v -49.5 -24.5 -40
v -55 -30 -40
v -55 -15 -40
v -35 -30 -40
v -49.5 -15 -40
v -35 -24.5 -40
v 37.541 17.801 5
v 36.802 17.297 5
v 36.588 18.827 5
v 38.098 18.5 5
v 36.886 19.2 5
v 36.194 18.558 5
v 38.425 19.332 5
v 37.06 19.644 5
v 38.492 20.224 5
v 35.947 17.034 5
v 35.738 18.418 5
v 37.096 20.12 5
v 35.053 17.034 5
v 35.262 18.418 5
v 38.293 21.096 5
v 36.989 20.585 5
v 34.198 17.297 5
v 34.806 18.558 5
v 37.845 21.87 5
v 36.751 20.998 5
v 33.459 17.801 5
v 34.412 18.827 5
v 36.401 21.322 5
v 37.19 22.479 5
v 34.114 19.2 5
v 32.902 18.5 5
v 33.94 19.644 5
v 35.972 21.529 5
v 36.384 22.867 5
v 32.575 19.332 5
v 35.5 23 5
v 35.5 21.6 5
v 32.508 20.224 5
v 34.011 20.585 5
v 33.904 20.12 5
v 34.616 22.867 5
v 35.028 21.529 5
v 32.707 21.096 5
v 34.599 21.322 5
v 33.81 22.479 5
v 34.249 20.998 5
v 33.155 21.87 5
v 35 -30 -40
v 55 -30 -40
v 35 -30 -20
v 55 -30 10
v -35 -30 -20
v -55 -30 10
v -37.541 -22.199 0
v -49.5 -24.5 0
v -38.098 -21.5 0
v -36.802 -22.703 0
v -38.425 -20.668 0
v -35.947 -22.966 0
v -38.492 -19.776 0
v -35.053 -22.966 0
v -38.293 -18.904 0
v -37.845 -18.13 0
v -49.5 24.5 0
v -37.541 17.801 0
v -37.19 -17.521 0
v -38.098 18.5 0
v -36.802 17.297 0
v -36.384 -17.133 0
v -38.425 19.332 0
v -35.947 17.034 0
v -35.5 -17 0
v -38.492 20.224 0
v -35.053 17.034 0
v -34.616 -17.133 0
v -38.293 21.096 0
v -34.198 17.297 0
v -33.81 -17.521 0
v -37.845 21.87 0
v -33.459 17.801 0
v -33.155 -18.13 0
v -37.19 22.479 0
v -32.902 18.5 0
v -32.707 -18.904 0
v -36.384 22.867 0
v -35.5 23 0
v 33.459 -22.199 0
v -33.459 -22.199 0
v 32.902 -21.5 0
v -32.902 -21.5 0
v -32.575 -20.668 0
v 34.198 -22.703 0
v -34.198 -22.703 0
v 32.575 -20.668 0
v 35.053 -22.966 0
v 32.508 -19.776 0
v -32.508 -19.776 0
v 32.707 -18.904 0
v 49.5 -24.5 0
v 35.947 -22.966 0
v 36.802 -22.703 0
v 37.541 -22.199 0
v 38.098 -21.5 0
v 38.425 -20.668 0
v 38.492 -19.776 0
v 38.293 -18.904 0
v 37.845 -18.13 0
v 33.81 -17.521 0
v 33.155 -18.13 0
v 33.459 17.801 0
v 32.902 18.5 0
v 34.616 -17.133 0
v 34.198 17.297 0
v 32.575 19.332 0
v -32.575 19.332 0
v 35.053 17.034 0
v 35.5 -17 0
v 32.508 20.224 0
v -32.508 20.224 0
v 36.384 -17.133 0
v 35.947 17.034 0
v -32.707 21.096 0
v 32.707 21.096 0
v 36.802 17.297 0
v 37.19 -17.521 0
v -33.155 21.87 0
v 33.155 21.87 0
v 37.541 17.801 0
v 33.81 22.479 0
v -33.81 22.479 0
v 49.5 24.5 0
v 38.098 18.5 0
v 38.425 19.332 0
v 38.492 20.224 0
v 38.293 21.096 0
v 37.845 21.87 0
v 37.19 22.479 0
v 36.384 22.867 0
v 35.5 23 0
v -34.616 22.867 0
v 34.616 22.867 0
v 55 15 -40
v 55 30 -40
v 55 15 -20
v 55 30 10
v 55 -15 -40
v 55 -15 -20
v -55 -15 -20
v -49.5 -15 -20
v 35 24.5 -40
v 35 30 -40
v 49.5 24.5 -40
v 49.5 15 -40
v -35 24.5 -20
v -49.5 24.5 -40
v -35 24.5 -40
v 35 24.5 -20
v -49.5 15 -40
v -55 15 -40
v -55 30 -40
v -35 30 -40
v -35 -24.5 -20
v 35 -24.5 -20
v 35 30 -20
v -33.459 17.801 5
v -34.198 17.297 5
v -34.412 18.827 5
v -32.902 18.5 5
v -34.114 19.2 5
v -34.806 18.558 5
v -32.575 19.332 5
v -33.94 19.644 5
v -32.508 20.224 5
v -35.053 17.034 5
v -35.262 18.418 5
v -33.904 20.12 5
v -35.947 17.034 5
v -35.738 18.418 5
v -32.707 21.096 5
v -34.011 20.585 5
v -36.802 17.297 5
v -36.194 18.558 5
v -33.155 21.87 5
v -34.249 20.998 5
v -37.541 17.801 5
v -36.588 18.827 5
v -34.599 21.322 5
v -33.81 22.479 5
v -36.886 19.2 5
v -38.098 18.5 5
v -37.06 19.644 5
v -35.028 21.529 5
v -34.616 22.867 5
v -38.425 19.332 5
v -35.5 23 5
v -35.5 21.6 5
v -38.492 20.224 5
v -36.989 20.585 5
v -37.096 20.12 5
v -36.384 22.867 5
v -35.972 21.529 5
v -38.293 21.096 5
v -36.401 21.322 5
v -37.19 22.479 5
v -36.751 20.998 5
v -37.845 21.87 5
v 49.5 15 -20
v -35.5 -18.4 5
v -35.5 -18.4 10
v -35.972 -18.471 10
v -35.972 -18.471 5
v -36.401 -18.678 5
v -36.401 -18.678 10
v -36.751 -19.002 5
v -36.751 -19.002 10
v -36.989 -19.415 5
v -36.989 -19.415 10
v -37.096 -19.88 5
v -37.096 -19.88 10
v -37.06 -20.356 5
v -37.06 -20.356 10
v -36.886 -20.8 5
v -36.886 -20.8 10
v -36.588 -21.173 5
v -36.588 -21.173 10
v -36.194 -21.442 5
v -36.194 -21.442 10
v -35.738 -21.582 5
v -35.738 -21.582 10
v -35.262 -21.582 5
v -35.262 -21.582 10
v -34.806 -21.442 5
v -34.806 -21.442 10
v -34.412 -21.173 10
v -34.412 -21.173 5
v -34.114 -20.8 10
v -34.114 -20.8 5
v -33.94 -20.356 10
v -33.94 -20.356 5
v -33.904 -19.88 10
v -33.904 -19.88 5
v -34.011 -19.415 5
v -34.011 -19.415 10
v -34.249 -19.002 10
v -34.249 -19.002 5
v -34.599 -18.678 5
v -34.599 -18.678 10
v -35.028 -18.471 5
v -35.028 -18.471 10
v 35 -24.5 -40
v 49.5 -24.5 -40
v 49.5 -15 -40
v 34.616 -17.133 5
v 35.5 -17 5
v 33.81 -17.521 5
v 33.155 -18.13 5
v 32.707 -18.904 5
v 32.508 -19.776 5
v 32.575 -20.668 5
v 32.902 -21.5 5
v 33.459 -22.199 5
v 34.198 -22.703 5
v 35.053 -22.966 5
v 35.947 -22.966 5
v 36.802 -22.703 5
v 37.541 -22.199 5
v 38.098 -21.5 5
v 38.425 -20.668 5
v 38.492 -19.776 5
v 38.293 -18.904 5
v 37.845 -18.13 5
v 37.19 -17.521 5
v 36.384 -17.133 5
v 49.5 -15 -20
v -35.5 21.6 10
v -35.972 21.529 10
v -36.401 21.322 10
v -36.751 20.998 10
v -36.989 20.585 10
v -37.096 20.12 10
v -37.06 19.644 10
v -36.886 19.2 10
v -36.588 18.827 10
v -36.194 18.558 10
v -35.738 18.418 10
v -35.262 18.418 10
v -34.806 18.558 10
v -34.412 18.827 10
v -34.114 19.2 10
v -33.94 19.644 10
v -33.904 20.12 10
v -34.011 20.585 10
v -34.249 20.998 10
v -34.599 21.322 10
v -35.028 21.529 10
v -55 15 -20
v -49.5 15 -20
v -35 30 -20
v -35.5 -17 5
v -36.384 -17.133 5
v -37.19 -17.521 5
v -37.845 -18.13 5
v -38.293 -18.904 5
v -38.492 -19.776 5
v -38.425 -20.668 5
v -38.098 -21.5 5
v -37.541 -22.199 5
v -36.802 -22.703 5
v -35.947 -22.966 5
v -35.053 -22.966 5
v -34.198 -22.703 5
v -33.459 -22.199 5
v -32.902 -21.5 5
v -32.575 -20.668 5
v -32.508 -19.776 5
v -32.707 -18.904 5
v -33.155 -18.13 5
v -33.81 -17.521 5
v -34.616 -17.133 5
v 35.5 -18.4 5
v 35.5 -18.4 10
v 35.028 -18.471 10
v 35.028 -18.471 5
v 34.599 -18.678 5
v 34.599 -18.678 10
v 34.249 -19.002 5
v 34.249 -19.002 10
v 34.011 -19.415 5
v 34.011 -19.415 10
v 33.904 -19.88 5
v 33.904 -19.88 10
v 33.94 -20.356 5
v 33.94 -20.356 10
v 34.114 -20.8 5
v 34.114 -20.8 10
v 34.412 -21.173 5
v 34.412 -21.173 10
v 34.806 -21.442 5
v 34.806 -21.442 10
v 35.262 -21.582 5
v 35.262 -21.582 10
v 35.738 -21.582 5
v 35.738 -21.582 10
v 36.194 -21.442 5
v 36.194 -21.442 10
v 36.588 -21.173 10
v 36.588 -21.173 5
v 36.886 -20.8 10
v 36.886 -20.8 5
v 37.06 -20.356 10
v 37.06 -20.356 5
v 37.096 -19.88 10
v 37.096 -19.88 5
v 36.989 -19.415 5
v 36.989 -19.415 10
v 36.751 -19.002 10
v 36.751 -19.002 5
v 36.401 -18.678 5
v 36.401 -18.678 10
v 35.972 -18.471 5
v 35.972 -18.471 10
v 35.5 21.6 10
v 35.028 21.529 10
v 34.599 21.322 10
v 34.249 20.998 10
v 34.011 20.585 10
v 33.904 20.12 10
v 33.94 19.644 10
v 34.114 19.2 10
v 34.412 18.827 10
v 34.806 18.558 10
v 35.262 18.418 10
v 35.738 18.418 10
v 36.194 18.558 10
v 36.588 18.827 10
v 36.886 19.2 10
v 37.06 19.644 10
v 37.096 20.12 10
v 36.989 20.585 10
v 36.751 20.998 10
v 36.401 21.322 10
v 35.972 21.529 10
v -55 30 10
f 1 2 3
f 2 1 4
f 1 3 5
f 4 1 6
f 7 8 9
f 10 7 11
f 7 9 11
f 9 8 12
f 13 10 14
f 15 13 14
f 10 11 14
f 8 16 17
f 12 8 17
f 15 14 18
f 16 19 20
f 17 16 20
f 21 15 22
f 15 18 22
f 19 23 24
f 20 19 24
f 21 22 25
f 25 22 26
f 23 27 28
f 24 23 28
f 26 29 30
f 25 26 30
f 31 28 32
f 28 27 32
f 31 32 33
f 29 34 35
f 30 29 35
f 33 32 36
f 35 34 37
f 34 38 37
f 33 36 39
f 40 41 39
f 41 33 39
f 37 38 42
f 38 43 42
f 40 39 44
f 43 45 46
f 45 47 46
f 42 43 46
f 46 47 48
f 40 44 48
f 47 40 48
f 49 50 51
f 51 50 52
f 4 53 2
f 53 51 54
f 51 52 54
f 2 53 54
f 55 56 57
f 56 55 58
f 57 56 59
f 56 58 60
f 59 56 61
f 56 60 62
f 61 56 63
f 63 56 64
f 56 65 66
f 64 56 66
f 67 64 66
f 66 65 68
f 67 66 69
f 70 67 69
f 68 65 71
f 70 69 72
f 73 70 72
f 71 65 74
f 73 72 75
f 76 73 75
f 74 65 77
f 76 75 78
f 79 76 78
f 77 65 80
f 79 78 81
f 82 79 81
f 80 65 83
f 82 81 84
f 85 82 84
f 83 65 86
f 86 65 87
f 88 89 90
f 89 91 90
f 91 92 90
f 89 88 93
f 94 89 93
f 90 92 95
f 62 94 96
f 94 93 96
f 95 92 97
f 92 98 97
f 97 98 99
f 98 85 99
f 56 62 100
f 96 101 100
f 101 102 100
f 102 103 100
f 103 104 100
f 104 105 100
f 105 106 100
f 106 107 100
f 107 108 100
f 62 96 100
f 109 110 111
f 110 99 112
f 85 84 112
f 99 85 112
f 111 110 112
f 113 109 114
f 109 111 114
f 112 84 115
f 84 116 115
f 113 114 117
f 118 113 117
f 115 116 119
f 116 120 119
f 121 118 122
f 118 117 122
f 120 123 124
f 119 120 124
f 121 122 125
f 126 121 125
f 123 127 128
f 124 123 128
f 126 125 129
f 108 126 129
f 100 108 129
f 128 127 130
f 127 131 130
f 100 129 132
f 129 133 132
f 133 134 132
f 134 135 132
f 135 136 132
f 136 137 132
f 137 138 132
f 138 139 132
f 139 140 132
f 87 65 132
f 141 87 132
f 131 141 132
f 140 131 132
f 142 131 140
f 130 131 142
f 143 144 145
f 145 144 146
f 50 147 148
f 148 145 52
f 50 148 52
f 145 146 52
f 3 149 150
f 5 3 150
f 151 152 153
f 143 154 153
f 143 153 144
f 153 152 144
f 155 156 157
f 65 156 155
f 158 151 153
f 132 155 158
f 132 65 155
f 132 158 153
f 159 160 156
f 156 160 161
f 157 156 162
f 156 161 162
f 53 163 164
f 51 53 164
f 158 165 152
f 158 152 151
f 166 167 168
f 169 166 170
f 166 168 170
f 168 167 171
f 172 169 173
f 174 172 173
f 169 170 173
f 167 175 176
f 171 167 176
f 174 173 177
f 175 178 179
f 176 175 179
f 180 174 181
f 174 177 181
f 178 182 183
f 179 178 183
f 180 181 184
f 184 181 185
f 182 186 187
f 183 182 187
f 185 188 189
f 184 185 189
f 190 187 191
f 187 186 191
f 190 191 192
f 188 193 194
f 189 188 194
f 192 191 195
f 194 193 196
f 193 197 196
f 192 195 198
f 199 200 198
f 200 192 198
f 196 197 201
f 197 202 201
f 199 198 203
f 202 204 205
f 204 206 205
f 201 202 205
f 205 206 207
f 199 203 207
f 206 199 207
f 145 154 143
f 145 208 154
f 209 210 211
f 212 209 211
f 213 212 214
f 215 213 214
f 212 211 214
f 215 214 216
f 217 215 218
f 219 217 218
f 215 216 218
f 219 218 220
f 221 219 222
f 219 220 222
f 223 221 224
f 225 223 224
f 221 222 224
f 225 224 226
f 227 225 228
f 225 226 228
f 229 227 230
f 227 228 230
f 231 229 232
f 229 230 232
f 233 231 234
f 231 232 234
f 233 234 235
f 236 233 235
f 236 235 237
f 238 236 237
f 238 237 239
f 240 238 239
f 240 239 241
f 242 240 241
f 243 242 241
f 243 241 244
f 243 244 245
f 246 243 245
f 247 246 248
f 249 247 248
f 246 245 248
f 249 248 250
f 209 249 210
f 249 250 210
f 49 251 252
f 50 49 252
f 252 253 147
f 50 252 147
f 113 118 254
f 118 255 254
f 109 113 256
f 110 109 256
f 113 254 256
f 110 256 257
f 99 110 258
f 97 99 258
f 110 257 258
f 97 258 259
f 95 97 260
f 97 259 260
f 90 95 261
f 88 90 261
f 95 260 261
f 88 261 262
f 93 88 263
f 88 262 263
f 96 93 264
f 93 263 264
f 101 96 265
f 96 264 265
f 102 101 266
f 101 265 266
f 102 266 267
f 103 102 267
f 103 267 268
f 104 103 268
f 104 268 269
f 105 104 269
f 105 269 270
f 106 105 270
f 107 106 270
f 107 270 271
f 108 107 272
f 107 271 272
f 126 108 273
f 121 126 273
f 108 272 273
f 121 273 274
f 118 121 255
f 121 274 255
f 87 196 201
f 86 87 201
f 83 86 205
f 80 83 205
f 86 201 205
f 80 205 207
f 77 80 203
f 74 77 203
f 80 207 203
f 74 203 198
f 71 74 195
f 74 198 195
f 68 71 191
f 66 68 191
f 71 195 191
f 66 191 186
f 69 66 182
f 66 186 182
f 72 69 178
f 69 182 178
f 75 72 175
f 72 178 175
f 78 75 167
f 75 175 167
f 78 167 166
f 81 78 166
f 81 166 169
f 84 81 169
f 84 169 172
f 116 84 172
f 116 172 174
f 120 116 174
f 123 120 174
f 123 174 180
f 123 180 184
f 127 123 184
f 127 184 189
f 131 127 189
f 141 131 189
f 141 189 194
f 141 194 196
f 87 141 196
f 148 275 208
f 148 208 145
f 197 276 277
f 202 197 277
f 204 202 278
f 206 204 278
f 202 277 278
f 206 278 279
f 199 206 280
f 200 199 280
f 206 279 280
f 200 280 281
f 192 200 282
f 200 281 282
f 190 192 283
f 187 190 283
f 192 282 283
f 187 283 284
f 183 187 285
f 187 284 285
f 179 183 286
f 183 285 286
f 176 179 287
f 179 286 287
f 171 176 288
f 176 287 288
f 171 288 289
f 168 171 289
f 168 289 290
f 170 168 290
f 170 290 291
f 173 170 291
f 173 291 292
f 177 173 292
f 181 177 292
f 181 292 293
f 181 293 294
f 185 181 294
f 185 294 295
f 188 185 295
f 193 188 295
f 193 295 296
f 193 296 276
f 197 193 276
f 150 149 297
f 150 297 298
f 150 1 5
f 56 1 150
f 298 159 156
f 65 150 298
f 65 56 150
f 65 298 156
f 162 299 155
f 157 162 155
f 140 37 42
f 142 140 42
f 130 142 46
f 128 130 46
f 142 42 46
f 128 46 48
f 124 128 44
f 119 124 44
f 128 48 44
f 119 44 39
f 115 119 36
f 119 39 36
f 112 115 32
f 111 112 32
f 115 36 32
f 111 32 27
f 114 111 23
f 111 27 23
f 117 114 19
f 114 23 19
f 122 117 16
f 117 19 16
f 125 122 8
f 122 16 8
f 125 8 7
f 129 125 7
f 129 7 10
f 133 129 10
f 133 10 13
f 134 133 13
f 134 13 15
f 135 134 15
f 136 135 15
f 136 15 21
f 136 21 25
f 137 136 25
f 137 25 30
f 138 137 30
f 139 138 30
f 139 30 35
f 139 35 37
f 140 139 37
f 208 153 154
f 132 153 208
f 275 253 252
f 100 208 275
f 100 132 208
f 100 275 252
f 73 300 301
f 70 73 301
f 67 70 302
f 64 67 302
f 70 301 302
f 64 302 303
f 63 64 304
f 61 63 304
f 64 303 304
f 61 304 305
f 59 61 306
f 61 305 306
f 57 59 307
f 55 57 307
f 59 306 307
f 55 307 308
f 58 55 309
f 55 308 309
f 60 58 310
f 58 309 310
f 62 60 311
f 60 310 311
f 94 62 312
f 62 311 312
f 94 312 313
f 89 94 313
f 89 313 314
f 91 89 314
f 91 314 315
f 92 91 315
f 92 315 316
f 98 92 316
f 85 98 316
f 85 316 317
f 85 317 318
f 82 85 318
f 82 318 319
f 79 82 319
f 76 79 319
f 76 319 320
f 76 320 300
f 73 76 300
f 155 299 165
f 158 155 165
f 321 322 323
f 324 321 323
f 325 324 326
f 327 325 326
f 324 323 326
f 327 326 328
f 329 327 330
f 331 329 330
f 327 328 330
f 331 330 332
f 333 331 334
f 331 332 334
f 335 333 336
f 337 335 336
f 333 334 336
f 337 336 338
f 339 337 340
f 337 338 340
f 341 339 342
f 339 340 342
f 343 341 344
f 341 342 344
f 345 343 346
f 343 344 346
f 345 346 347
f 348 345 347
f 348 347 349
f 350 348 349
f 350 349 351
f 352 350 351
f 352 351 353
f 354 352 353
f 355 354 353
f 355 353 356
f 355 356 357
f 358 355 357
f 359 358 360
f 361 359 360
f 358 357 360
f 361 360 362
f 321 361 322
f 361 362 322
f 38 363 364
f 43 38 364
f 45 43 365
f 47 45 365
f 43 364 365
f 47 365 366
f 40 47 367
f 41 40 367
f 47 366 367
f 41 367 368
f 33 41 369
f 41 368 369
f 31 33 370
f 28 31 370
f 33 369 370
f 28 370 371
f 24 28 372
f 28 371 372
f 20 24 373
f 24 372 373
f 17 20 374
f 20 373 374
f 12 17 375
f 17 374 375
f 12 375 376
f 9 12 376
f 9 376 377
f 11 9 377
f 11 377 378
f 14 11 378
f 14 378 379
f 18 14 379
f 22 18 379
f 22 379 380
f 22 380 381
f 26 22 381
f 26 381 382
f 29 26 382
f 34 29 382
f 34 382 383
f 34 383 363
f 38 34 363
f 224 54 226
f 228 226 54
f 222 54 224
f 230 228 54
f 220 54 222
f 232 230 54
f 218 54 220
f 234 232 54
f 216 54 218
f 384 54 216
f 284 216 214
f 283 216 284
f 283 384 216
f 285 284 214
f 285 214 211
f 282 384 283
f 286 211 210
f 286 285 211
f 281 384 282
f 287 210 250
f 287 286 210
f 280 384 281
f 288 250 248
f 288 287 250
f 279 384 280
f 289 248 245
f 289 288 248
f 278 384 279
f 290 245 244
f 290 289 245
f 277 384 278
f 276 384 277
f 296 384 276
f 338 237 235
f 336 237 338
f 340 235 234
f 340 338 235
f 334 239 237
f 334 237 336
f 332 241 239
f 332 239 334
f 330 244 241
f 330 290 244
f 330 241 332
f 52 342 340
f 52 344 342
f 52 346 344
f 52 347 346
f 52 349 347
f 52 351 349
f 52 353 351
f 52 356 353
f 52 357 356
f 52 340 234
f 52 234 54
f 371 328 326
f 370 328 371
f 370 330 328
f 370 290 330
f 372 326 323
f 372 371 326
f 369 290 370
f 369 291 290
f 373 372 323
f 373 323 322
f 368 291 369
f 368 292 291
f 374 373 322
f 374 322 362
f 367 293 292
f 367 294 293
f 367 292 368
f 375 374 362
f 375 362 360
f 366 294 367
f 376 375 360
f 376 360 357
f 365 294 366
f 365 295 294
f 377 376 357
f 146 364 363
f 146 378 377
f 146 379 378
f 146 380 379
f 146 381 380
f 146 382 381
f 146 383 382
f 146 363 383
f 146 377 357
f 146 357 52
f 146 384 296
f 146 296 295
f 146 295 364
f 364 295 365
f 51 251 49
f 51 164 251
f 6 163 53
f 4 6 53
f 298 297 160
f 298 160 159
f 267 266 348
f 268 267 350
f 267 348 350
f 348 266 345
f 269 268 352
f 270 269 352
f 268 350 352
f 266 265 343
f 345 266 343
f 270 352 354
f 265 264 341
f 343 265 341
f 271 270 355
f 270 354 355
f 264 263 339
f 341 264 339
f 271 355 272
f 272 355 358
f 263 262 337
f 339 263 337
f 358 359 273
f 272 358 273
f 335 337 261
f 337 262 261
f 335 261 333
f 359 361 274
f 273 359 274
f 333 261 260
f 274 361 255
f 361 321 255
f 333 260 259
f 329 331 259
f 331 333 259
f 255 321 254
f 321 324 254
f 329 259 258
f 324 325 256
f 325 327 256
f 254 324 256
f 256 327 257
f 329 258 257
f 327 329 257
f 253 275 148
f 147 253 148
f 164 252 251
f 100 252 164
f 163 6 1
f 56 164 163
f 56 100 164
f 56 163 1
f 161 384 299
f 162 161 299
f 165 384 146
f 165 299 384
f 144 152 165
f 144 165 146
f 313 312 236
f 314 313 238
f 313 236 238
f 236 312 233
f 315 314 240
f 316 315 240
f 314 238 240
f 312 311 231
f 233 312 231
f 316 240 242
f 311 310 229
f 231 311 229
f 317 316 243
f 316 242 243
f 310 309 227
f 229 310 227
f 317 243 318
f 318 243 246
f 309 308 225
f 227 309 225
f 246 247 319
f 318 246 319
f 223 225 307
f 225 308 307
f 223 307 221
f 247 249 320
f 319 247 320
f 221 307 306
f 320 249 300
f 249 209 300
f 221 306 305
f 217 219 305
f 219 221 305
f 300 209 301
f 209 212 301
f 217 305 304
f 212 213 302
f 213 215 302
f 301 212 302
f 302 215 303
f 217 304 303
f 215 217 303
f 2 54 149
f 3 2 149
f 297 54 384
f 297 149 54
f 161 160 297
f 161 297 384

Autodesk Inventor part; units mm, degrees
ref_plane "YZ Plane" through (0, 0, 0) normal (1, 0, 0) x (0, 1, 0)
ref_plane "XZ Plane" through (0, 0, 0) normal (0, 1, 0) x (-1, 0, 0)
ref_plane "XY Plane" through (0, 0, 0) normal (0, 0, 1) x (1, 0, 0)
sketch "Sketch1" plane through (0, 0, 0) normal (0, 0, 1) x (1, 0, 0)
  line L0 (55, -30) -> (-55, -30)
  line L1 (-55, -30) -> (-55, 30)
  line L2 (-55, 30) -> (55, 30)
  line L3 (55, 30) -> (55, -30)
  line L4 (49.5, -24.5) -> (-49.5, -24.5)
  line L5 (-49.5, -24.5) -> (-49.5, 24.5)
  line L6 (-49.5, 24.5) -> (49.5, 24.5)
  line L7 (49.5, 24.5) -> (49.5, -24.5)
  line L8 (55, 0) -> (-55, 0) construction
  line L9 (0, -30) -> (0, 30) construction
  line L10 (-35, 30) -> (-35, 24.5)
  line L11 (-55, 15) -> (-49.5, 15)
  line L12 (35, -24.5) -> (35, -30)
  line L13 (49.5, -15) -> (55, -15)
  line L14 (-35, -24.5) -> (-35, -30)
  line L15 (-55, -15) -> (-49.5, -15)
  line L16 (35, 30) -> (35, 24.5)
  line L17 (49.5, 15) -> (55, 15)
  line L18 (-52.25, 27.25) -> (52.25, 27.25) construction
  line L19 (52.25, 27.25) -> (52.25, -27.25) construction
  line L20 (52.25, -27.25) -> (-52.25, -27.25) construction
  line L21 (-52.25, -27.25) -> (-52.25, 27.25) construction
  line L22 (-52.25, 27.25) -> (52.25, -27.25) construction
  line L23 (52.25, 27.25) -> (-52.25, -27.25) construction
  point P0 (0, 0)
  point P1 (-35.5, 20)
  point P2 (35.5, 20)
  point P3 (35.5, -20)
  point P4 (-35.5, -20)
  dimension "d0" = 110
  dimension "d1" = 60
  dimension "d2" = 99
  dimension "d3" = 49
  dimension "d4" = 15
  dimension "d5" = 20
  dimension "d6" = 40
  dimension "d7" = 71
extrude "Extrusion1" add sketch "Sketch1" against normal blind 40 contours L0 L12 L4 L7 L13 L3 | L0 L1 L15 L5 L4 L14 | L17 L7 L6 L16 L2 L3 | L1 L2 L10 L6 L5 L11
extrude "Extrusion2" add sketch "Sketch1" along normal blind 10
hole "Hole1" at (-35.5, 20, 0) at (35.5, 20, 0) at (35.5, -20, 0) at (-35.5, -20, 0) direction (0, 0, 1) diameter 3.2 end through all counterbore diameter 6 counterbore depth 5
extrude "Extrusion8" add sketch "Sketch1" against normal blind 20 contours L0 L14 L4 L12 | L13 L7 L17 L3 | L1 L11 L5 L15 | L16 L6 L10 L2
equation "\"epsilon\" = 0"
properties part number "magnet_holder" material "PC/ABS Plastic"
